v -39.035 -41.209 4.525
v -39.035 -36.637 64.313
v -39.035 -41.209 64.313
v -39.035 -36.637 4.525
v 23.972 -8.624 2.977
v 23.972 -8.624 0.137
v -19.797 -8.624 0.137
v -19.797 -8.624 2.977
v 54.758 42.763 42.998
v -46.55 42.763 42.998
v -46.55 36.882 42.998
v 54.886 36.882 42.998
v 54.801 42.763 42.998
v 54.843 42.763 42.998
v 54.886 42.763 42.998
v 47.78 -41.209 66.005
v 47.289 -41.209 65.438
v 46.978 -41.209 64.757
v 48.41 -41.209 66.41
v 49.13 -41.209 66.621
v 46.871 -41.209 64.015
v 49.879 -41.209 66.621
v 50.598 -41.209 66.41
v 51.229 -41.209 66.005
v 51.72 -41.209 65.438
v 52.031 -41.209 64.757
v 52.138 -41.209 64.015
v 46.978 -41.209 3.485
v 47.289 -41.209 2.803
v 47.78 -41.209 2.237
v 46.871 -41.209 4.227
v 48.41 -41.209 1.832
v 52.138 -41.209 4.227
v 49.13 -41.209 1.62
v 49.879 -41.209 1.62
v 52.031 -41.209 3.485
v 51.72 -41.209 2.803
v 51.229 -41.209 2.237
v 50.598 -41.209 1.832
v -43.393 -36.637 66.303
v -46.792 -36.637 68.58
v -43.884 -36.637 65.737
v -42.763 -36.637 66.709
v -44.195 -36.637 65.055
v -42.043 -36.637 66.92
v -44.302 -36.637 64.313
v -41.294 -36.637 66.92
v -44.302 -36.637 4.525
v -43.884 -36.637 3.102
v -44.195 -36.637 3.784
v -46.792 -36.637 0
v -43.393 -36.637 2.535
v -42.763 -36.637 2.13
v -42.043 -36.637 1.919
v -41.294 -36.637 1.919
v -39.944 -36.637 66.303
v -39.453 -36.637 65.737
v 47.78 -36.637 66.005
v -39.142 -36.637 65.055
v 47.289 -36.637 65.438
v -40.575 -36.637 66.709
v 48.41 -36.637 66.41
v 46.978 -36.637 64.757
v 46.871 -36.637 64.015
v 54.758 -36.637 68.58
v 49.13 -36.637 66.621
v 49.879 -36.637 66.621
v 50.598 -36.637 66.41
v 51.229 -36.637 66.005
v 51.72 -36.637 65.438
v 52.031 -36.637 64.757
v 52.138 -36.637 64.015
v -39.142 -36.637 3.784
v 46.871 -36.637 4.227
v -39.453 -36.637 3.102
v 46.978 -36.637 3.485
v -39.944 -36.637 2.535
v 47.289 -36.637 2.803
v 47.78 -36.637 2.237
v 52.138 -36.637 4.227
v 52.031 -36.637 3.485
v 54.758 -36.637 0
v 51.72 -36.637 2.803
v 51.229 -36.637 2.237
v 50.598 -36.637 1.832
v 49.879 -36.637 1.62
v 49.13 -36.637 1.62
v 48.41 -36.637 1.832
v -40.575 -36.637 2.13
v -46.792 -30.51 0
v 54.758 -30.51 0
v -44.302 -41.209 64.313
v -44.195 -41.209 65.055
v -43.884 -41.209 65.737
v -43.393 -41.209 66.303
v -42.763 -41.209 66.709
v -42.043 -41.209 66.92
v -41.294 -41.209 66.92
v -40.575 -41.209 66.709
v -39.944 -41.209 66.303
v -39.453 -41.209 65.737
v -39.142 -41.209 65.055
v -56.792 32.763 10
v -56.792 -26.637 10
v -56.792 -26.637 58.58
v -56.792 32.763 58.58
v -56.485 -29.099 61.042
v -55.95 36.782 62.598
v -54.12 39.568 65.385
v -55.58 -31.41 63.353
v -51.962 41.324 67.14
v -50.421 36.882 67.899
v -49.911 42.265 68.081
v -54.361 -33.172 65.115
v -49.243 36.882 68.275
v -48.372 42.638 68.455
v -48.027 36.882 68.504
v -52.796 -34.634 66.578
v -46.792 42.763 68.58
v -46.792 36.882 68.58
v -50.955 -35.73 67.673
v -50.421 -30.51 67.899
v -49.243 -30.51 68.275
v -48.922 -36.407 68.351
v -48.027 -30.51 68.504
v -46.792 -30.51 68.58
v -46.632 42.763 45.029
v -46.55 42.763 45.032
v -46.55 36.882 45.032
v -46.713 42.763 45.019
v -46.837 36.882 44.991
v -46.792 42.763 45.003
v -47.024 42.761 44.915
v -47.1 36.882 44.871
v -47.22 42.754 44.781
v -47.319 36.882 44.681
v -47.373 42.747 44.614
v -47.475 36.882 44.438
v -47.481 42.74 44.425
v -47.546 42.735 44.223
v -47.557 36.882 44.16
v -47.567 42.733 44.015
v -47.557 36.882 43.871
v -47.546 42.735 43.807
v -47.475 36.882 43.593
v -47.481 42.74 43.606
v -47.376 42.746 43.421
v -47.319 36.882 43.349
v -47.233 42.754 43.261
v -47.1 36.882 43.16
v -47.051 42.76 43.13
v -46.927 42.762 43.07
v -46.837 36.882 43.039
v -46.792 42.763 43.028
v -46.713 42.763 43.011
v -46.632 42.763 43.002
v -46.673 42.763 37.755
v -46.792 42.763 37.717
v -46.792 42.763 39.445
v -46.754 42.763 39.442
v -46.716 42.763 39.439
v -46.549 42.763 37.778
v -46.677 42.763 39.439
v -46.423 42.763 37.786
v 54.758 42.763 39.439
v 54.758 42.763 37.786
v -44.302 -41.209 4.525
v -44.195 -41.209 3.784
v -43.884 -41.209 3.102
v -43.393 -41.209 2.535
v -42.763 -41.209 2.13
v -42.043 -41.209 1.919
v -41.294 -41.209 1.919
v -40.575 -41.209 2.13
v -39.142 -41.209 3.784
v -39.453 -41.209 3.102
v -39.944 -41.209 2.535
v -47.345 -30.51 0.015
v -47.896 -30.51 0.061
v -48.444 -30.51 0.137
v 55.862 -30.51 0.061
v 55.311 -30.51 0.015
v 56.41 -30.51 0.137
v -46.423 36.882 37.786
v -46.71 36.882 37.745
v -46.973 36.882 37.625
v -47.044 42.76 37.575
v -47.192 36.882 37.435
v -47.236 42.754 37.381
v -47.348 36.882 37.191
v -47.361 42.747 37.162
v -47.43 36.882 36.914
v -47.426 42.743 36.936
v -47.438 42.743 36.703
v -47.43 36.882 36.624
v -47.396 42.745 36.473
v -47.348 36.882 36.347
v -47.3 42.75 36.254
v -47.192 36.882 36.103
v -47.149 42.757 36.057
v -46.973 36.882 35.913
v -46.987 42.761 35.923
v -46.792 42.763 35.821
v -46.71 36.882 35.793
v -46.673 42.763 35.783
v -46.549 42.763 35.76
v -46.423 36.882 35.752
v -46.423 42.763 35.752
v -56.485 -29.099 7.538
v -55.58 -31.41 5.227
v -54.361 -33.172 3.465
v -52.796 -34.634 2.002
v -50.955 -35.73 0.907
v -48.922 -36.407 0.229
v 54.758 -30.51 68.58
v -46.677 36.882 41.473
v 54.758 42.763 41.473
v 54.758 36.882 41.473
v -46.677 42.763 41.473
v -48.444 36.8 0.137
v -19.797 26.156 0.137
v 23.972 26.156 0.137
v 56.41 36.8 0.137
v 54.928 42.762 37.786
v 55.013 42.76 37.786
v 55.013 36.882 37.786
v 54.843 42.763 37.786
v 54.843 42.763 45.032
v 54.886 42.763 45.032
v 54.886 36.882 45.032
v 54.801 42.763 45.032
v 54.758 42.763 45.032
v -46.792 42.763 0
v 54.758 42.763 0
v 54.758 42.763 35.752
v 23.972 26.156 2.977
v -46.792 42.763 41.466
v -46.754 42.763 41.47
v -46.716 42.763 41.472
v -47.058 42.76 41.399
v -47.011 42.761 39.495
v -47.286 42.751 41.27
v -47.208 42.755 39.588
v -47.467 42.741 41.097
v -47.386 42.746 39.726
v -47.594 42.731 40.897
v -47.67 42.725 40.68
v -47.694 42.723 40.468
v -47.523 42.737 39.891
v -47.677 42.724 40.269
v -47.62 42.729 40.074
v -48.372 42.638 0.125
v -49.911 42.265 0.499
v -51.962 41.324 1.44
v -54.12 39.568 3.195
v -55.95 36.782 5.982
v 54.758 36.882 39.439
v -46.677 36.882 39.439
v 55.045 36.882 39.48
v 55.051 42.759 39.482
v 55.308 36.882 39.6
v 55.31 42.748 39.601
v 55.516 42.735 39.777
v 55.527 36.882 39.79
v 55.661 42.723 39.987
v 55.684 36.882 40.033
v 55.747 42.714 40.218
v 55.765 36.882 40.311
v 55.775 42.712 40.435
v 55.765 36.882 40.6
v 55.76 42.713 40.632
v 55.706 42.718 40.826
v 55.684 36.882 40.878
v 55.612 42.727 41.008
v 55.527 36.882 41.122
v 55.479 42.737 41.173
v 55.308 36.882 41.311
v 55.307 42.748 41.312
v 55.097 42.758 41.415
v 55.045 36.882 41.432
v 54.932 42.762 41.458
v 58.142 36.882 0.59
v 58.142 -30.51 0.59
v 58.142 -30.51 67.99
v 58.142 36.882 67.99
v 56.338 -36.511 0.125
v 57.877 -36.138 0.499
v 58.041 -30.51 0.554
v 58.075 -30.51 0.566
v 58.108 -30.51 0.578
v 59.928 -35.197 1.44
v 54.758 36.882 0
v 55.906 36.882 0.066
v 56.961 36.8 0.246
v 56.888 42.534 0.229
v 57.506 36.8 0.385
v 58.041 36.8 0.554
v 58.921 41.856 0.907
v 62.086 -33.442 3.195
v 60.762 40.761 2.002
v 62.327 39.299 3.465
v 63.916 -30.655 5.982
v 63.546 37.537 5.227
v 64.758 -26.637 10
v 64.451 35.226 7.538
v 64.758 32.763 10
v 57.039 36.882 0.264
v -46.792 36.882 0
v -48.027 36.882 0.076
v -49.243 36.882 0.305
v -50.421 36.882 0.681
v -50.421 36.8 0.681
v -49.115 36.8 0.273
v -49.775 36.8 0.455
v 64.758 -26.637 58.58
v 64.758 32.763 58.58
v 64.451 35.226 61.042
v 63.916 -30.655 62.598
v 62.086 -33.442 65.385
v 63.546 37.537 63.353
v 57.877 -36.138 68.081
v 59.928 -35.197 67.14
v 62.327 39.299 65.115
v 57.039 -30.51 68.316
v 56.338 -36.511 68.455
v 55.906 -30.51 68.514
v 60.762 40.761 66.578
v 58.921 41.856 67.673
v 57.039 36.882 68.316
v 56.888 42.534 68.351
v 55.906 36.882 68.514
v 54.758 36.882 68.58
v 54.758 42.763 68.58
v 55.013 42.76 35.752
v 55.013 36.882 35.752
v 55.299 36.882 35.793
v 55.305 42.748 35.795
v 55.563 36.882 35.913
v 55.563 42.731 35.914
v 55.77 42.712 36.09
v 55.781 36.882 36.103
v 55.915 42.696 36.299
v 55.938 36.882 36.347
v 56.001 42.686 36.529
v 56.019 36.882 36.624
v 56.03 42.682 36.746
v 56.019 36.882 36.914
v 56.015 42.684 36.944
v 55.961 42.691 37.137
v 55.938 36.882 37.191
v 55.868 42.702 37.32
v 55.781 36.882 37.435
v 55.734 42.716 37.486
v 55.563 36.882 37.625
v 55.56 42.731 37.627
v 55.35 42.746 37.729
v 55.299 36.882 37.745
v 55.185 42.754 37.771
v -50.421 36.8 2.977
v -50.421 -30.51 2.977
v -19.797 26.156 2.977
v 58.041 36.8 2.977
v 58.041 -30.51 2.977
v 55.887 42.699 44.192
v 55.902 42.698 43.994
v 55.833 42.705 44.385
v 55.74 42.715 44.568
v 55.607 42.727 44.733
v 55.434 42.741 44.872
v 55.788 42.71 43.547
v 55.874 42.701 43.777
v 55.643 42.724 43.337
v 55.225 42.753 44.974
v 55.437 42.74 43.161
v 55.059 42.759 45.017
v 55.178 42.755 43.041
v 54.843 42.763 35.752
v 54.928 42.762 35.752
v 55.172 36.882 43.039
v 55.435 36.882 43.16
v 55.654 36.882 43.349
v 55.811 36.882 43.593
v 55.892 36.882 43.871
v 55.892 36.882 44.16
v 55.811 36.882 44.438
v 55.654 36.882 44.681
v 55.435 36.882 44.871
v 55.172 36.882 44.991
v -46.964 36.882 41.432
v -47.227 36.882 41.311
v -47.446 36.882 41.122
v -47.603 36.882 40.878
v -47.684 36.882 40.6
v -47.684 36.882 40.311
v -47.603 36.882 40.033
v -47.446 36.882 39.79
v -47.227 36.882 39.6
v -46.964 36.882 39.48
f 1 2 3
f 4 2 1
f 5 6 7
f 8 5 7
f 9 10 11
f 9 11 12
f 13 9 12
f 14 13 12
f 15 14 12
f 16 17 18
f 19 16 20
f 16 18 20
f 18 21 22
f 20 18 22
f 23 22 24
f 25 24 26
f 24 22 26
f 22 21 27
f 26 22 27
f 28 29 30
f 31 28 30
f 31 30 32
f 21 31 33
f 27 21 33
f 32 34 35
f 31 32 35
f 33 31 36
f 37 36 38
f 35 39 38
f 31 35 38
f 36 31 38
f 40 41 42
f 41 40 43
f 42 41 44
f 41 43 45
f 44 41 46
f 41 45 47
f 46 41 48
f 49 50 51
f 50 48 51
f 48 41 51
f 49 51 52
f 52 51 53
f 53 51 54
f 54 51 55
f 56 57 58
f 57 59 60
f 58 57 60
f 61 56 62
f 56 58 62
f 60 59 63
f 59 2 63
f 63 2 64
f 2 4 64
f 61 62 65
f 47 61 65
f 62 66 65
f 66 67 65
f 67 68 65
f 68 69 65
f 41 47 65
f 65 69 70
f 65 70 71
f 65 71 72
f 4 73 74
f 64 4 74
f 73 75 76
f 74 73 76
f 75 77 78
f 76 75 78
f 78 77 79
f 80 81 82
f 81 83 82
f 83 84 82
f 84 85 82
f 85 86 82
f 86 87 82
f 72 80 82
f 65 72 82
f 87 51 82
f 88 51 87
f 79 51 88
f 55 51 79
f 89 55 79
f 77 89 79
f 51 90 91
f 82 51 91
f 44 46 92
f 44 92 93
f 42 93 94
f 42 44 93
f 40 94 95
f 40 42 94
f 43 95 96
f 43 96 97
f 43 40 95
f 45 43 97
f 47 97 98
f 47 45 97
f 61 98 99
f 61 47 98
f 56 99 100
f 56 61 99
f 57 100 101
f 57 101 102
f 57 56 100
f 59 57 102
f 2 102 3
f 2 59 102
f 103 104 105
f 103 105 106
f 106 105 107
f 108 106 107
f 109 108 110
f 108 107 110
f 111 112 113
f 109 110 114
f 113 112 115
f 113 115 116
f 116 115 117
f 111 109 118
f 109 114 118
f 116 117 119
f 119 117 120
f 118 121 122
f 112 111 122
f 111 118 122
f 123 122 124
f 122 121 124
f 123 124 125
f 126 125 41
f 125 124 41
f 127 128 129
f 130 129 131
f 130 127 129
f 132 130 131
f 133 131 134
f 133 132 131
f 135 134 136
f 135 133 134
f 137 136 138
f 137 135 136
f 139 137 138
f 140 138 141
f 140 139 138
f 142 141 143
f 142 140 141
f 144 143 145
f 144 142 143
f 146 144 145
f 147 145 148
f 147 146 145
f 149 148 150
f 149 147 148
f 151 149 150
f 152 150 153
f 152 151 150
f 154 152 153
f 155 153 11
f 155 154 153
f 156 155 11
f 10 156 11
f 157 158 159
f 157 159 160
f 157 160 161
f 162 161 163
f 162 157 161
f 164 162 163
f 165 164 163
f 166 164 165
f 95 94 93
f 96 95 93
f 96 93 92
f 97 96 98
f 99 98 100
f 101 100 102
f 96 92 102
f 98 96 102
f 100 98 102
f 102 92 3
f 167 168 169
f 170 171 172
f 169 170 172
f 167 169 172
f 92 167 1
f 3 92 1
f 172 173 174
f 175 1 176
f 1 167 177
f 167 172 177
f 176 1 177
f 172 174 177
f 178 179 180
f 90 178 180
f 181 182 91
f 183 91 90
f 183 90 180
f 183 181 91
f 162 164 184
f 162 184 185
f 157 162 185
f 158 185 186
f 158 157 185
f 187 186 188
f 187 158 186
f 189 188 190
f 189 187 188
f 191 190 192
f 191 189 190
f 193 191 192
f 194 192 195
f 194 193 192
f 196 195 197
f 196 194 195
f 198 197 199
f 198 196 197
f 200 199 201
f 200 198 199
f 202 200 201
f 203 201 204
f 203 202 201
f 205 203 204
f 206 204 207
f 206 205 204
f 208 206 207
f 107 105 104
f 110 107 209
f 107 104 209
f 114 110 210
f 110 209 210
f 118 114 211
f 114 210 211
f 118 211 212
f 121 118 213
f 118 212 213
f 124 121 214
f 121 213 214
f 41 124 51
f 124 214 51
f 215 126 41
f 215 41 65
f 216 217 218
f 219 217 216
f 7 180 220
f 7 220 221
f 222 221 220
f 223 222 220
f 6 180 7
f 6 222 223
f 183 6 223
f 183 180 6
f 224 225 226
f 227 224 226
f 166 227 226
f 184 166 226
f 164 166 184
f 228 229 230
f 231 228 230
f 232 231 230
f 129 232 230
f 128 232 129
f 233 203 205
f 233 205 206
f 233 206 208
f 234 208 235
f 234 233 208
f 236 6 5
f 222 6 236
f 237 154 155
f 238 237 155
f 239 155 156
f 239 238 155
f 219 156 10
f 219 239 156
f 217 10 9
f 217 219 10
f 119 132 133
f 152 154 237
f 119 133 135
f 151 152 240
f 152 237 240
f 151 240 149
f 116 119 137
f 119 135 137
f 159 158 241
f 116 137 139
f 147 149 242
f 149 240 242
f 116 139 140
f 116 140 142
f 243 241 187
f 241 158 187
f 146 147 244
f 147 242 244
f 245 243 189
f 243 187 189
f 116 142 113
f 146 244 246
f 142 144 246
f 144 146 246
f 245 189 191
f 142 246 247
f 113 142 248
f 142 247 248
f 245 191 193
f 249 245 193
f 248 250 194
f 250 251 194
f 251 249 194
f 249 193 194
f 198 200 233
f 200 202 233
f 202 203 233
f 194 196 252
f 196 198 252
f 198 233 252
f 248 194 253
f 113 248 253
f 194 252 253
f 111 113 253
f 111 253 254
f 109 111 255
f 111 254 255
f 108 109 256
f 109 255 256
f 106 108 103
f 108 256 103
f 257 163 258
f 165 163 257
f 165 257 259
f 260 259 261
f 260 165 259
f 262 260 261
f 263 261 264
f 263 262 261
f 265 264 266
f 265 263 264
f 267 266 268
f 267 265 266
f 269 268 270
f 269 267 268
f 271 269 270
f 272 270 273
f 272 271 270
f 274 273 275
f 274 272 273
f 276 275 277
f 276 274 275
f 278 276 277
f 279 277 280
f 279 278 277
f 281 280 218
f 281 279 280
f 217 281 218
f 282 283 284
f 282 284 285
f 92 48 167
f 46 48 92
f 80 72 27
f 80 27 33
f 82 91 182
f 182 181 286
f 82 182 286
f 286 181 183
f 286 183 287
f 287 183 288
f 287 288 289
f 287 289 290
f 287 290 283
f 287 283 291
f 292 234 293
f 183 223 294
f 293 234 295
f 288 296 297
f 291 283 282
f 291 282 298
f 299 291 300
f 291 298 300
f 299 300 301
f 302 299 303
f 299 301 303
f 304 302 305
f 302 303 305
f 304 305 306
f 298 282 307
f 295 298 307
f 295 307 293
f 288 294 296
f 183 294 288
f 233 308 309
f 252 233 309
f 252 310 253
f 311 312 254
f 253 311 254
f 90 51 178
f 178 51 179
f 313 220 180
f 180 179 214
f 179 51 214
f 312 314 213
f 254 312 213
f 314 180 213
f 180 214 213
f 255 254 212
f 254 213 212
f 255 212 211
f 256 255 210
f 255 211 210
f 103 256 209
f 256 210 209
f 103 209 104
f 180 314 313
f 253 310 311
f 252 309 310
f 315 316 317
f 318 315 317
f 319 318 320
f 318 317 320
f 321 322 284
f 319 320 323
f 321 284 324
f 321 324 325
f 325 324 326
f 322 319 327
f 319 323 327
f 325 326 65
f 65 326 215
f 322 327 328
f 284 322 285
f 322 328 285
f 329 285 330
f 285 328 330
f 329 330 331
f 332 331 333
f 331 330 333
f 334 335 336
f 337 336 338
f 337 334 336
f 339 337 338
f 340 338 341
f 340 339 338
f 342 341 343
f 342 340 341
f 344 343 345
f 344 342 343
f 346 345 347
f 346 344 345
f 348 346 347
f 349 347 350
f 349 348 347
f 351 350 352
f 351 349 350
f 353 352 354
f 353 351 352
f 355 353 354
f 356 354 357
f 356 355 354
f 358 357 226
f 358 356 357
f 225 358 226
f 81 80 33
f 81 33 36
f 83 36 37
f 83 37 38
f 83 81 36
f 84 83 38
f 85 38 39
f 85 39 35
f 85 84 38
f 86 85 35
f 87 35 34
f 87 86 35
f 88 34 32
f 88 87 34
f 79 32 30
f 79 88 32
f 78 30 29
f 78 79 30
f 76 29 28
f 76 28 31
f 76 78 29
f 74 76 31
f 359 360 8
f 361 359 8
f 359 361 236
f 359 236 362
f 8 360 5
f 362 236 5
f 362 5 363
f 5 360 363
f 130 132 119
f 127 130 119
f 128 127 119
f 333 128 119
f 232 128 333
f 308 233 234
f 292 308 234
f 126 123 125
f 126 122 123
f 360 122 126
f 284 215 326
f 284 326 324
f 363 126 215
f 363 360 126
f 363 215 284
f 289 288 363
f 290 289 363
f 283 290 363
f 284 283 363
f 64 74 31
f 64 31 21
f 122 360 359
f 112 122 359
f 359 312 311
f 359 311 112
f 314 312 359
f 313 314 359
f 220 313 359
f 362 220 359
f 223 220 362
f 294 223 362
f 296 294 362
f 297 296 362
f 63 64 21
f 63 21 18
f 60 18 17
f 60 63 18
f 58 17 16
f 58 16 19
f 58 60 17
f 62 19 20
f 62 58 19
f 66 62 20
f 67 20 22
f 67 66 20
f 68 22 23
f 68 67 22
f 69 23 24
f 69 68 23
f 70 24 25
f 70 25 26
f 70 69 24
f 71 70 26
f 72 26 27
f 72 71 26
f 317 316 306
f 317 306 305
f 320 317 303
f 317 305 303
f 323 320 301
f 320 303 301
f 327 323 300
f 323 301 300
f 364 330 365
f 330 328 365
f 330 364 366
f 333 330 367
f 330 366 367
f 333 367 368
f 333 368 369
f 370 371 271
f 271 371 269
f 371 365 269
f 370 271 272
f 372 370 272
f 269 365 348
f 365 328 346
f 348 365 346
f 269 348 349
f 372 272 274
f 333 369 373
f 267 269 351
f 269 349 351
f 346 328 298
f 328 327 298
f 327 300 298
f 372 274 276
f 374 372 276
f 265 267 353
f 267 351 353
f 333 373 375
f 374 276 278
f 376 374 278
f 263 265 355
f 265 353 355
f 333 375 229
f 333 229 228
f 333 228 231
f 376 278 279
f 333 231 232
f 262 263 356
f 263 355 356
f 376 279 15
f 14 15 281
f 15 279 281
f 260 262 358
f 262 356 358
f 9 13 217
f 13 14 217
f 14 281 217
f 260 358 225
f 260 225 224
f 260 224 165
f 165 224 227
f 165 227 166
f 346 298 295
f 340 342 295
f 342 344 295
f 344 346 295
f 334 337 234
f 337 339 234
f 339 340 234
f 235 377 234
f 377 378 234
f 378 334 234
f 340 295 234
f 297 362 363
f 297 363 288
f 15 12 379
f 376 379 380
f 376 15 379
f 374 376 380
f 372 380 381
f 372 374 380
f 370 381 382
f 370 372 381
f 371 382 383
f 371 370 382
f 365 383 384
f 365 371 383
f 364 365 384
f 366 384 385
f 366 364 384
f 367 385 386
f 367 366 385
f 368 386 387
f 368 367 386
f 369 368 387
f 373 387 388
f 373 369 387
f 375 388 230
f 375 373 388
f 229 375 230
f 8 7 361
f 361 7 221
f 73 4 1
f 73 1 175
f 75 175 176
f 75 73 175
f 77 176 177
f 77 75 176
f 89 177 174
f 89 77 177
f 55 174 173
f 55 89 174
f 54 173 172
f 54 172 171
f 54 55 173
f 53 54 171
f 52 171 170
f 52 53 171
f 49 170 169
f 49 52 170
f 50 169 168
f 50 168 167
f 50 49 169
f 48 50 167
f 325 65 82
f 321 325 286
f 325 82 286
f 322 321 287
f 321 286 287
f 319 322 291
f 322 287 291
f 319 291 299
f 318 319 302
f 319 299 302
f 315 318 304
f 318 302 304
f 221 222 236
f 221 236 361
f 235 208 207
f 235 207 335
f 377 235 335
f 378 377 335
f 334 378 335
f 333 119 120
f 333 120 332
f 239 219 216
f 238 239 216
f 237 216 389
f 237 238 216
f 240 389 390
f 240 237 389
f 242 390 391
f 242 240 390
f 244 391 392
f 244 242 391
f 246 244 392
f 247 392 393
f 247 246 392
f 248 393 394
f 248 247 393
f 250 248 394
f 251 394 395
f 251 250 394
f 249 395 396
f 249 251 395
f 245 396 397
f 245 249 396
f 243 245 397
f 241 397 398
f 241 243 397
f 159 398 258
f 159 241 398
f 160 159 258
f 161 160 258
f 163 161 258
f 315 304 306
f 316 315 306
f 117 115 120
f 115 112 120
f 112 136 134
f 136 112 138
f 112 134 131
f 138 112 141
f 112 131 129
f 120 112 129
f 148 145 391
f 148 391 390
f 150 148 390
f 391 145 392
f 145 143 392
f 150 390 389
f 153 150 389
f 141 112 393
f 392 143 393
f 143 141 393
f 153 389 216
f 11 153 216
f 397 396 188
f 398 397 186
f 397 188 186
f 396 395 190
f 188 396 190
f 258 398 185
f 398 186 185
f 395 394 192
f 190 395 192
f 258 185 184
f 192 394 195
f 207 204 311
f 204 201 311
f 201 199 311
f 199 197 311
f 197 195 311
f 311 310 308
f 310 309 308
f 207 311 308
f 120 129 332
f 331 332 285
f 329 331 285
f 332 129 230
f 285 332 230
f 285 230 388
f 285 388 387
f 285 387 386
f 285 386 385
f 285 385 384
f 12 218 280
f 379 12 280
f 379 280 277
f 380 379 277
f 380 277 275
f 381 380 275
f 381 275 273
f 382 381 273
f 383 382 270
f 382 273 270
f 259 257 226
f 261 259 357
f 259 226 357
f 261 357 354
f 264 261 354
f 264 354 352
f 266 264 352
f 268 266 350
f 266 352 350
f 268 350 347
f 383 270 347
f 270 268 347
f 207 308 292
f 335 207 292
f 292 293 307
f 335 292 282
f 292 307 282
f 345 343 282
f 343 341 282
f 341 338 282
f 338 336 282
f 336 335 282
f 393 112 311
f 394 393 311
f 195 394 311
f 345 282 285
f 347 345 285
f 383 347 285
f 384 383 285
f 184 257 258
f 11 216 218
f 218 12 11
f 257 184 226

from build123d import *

# Parameters (mm, degrees)
IZIM1_W                     = 121.550964813
IZIM1_H                     = 79.400227015
IZIM1_W_2                   = 108.562656073
IZIM1_H_2                   = 67.392167991
Y_KSEKLIK_EKSTR_ZYON1_DEPTH = 68.58
IZIM2_W                     = 108.665778405
IZIM2_H                     = 2.839609685
Y_KSEKLIK_EKSTR_ZYON3_DEPTH = 67.31
IZIM4_W                     = 43.769026383
IZIM4_H                     = 34.779664875
KES_EKSTR_ZYON3_DEPTH       = 51.308
RADYUS1_R                   = 10
RADYUS2_R                   = 10
KES_EKSTR_ZYON6_DEPTH       = 25.4
Y_KSEKLIK_EKSTR_ZYON4_DEPTH = 4.572


with BuildPart() as part:
    # Çizim1 → Yükseklik-Ekstrüzyon1 (new body)
    with BuildSketch(Plane.XY):
        with Locations((3.983010787, 3.063280364)):
            Rectangle(IZIM1_W, IZIM1_H)
        with Locations((3.860479571, 3.185811577)):
            Rectangle(IZIM1_W_2, IZIM1_H_2, mode=Mode.SUBTRACT)
    extrude(amount=Y_KSEKLIK_EKSTR_ZYON1_DEPTH)

    # Çizim2 → Yükseklik-Ekstrüzyon3 (add)
    with BuildSketch(Plane(origin=(0, -30.510272418, 0), x_dir=(1, 0, 0), z_dir=(0, 1, 0))):
        with Locations((3.70835341, -1.557090266)):
            Rectangle(IZIM2_W, IZIM2_H)
    extrude(amount=Y_KSEKLIK_EKSTR_ZYON3_DEPTH)

    # Çizim4 → Kes-Ekstrüzyon3 (cut)
    with BuildSketch(Plane(origin=(0, 0, 0.137285424), x_dir=(-1, 0, 0), z_dir=(0, 0, -1))):
        with Locations((-2.08713858, 8.765719608)):
            Rectangle(IZIM4_W, IZIM4_H)
    extrude(amount=-KES_EKSTR_ZYON3_DEPTH, mode=Mode.SUBTRACT)

    # Radyus1
    # the kernel refuses this fillet: 10 mm, written as the material it takes off along each edge
    with BuildSketch(Plane(origin=(64.758493193, -36.636833144, -25), x_dir=(0, 1, 0), z_dir=(0, 0, 1)), Plane(origin=(64.758493193, 42.763393871, -25), x_dir=(-1, 0, 0), z_dir=(0, 0, 1))) as radyus1_piece_1:
        with BuildLine():
            CenterArc((RADYUS1_R, RADYUS1_R), RADYUS1_R, 180, 90)
            Line((0, RADYUS1_R), (0, 0))
            Line((0, 0), (RADYUS1_R, 0))
        make_face()
    extrude(amount=118.58, mode=Mode.SUBTRACT)
    with BuildSketch(Plane(origin=(64.758493193, 67.763393871, 68.58), x_dir=(0, 0, -1), z_dir=(0, -1, 0))) as radyus1_piece_2:
        with BuildLine():
            CenterArc((RADYUS1_R, -RADYUS1_R), RADYUS1_R, 90, 90)
            Line((0, -RADYUS1_R), (0, 0))
            Line((0, 0), (RADYUS1_R, 0))
        make_face()
    extrude(amount=129.400227015, mode=Mode.SUBTRACT)
    with BuildSketch(Plane(origin=(64.758493193, 67.763393871, 0), x_dir=(0, 0, 1), z_dir=(0, -1, 0))) as radyus1_piece_3:
        with BuildLine():
            CenterArc((RADYUS1_R, RADYUS1_R), RADYUS1_R, 180, 90)
            Line((0, RADYUS1_R), (0, 0))
            Line((0, 0), (RADYUS1_R, 0))
        make_face()
    extrude(amount=129.400227015, mode=Mode.SUBTRACT)

    # Radyus2
    # the kernel refuses this fillet: 10 mm, written as the material it takes off along each edge
    with BuildSketch(Plane(origin=(-56.79247162, 42.763393871, -25), x_dir=(1, 0, 0), z_dir=(0, 0, 1)), Plane(origin=(-56.79247162, -36.636833144, -25), x_dir=(0, 1, 0), z_dir=(0, 0, 1))) as radyus2_piece_1:
        with BuildLine():
            CenterArc((RADYUS2_R, -RADYUS2_R), RADYUS2_R, 90, 90)
            Line((0, -RADYUS2_R), (0, 0))
            Line((0, 0), (RADYUS2_R, 0))
        make_face()
    extrude(amount=118.58, mode=Mode.SUBTRACT)
    with BuildSketch(Plane(origin=(-56.79247162, -61.636833144, 68.58), x_dir=(1, 0, 0), z_dir=(0, 1, 0))) as radyus2_piece_2:
        with BuildLine():
            CenterArc((RADYUS2_R, RADYUS2_R), RADYUS2_R, 180, 90)
            Line((0, RADYUS2_R), (0, 0))
            Line((0, 0), (RADYUS2_R, 0))
        make_face()
    extrude(amount=129.400227015, mode=Mode.SUBTRACT)
    with BuildSketch(Plane(origin=(-56.79247162, -61.636833144, 0), x_dir=(1, 0, 0), z_dir=(0, 1, 0))) as radyus2_piece_3:
        with BuildLine():
            CenterArc((RADYUS2_R, -RADYUS2_R), RADYUS2_R, 90, 90)
            Line((0, -RADYUS2_R), (0, 0))
            Line((0, 0), (RADYUS2_R, 0))
        make_face()
    extrude(amount=129.400227015, mode=Mode.SUBTRACT)

    # Çizim5 → Kes-Ekstrüzyon6 (cut)
    with BuildSketch(Plane(origin=(0, 42.763393871, 0), x_dir=(1, 0, 0), z_dir=(0, 1, 0))):
        with BuildLine():
            Line((-46.423230595, -35.751971692), (55.012749139, -35.751971692))
            ThreePointArc((55.012749139, -35.751971692), (56.029772925, -36.768995478), (55.012749139, -37.786019263))
            Line((55.012749139, -37.786019263), (-46.423230595, -37.786019263))
            ThreePointArc((-46.423230595, -37.786019263), (-47.44025438, -36.768995478), (-46.423230595, -35.751971692))
        make_face()
        with BuildLine():
            Line((-46.550358568, -42.998266165), (54.885621166, -42.998266165))
            ThreePointArc((54.885621166, -42.998266165), (55.902644952, -44.015289951), (54.885621166, -45.032313737))
            Line((54.885621166, -45.032313737), (-46.550358568, -45.032313737))
            ThreePointArc((-46.550358568, -45.032313737), (-47.567382354, -44.015289951), (-46.550358568, -42.998266165))
        make_face()
        with BuildLine():
            Line((-46.677486541, -39.438682915), (54.758493193, -39.438682915))
            ThreePointArc((54.758493193, -39.438682915), (55.775516978, -40.455706701), (54.758493193, -41.472730487))
            Line((54.758493193, -41.472730487), (-46.677486541, -41.472730487))
            ThreePointArc((-46.677486541, -41.472730487), (-47.694510327, -40.455706701), (-46.677486541, -39.438682915))
        make_face()
    extrude(amount=-KES_EKSTR_ZYON6_DEPTH, mode=Mode.SUBTRACT)

    # Çizim6 → Yükseklik-Ekstrüzyon4 (add)
    with BuildSketch(Plane(origin=(0, -36.636833144, 0), x_dir=(-1, 0, 0), z_dir=(0, -1, 0))):
        with BuildLine():
            Line((-46.87100271, -4.227005014), (-46.87100271, -64.014742354))
            ThreePointArc((-46.87100271, -64.014742354), (-49.504404567, -66.64814421), (-52.137806423, -64.014742354))
            Line((-52.137806423, -64.014742354), (-52.137806423, -4.227005014))
            ThreePointArc((-52.137806423, -4.227005014), (-49.504404567, -1.593603158), (-46.87100271, -4.227005014))
        make_face()
        with BuildLine():
            Line((44.301980946, -4.525434052), (44.301980946, -64.313171393))
            ThreePointArc((44.301980946, -64.313171393), (41.66857909, -66.946573249), (39.035177234, -64.313171393))
            Line((39.035177234, -64.313171393), (39.035177234, -4.525434052))
            ThreePointArc((39.035177234, -4.525434052), (41.66857909, -1.892032196), (44.301980946, -4.525434052))
        make_face()
    extrude(amount=Y_KSEKLIK_EKSTR_ZYON4_DEPTH)


solid = part.part
